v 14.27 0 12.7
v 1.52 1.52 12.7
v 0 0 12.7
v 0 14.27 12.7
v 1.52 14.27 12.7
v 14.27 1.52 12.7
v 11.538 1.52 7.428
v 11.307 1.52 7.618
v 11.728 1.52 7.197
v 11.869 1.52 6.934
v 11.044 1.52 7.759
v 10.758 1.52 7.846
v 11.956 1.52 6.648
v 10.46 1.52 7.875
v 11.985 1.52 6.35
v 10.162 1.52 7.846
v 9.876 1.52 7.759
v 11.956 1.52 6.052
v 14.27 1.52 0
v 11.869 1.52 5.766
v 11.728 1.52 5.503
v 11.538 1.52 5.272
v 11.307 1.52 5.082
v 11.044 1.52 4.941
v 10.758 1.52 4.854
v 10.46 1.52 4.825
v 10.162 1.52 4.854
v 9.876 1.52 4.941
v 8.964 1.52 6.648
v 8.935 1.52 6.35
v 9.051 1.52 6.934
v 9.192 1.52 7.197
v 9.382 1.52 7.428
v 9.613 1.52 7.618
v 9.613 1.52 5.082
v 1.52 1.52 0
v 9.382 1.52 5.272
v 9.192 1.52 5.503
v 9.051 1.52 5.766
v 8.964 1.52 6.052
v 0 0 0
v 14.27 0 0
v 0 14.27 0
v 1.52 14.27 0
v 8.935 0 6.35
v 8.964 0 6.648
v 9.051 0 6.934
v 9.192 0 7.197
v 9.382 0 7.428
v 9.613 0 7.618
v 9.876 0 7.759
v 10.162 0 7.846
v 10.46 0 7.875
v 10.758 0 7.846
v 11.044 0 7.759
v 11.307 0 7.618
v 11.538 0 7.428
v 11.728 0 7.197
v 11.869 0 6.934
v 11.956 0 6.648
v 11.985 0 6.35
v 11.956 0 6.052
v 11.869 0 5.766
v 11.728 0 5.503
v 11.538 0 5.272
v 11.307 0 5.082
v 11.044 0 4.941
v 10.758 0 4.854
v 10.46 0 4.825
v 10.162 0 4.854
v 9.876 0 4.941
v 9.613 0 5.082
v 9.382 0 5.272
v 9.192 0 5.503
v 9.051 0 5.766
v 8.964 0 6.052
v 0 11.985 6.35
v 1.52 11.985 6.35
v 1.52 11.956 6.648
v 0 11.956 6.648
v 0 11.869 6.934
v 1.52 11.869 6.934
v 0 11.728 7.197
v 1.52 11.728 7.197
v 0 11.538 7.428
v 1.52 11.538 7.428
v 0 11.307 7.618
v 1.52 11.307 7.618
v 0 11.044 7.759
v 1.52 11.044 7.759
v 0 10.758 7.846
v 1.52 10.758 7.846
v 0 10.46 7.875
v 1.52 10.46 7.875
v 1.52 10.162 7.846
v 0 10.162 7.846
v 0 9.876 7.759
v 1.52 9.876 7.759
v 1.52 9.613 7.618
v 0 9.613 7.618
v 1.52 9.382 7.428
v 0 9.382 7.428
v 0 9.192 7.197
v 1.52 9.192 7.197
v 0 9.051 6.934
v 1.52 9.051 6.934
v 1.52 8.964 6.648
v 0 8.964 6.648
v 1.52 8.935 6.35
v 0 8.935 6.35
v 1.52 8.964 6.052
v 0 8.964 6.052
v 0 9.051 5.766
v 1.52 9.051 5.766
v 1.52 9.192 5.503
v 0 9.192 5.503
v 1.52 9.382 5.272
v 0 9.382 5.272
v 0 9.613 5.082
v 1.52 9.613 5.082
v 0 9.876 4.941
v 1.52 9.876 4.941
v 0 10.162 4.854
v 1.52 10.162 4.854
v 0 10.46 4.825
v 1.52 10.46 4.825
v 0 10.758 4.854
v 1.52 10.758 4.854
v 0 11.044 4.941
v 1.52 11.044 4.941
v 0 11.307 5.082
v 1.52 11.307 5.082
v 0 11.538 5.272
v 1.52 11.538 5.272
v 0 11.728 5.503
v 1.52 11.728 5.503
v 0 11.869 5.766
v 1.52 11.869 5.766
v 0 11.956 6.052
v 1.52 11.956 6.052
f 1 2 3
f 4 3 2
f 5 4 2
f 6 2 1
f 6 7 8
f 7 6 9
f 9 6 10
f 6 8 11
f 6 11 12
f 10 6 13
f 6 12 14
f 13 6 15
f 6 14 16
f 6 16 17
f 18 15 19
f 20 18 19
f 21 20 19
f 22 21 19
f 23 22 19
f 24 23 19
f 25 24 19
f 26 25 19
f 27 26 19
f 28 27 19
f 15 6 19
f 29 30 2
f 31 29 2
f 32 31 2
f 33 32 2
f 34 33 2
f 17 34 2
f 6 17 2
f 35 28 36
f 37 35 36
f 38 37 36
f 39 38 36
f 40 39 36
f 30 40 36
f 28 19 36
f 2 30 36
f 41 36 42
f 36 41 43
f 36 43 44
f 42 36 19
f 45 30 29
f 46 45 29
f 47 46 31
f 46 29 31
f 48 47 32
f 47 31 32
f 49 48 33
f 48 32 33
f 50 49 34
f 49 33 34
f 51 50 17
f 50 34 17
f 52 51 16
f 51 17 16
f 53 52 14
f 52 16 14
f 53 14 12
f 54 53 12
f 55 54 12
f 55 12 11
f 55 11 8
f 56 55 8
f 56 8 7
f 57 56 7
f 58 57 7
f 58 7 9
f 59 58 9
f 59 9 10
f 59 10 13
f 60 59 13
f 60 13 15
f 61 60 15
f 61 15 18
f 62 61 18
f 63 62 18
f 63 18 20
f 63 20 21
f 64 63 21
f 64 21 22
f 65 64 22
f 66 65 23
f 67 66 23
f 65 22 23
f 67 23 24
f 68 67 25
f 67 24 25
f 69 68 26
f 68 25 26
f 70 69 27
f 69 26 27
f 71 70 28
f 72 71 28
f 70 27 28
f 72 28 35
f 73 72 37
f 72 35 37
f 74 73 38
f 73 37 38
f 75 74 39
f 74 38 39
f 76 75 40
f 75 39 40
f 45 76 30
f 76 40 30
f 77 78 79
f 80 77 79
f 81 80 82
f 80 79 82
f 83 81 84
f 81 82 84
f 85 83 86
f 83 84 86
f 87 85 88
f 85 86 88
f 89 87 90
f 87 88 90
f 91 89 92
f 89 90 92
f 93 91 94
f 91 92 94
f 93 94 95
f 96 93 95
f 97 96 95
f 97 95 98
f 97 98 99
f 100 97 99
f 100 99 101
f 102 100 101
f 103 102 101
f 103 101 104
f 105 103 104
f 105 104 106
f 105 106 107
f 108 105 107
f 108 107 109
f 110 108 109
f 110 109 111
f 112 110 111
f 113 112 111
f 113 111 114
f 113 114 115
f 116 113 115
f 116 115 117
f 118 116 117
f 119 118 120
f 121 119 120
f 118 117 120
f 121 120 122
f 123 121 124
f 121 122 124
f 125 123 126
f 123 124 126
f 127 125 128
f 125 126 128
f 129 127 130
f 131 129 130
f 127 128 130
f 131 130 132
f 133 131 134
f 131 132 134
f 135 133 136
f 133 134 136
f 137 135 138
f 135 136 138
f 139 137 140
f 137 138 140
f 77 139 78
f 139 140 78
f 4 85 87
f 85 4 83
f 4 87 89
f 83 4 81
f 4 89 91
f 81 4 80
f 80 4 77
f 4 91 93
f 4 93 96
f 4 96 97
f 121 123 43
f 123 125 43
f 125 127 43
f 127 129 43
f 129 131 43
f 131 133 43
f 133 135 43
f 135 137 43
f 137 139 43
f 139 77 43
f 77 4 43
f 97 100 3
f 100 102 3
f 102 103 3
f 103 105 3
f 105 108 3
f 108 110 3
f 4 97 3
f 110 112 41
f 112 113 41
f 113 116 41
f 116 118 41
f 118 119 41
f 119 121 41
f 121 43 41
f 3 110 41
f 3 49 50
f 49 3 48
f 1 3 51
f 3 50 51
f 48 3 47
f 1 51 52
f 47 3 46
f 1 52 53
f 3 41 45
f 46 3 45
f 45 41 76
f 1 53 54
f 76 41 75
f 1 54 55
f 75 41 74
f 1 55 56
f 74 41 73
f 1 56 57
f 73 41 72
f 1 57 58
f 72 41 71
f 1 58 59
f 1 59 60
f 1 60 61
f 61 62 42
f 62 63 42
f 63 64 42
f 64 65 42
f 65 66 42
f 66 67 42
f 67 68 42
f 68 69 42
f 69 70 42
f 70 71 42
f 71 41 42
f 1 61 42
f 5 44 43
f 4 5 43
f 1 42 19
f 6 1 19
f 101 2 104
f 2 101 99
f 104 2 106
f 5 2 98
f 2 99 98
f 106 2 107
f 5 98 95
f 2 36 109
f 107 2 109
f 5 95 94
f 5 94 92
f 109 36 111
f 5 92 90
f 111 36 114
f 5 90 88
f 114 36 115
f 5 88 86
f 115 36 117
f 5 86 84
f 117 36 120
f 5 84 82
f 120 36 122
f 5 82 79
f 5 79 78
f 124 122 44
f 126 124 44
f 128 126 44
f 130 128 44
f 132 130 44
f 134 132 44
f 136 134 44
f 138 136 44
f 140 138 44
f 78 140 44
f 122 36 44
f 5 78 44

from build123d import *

# Parameters (mm, degrees)
BOSS_EXTRU_1_DEPTH      = 12.7
ESQUISSE2_R             = 1.525
ENL_V_MAT_EXTRU_1_DEPTH = 12.7
ESQUISSE3_R             = 1.525
ENL_V_MAT_EXTRU_2_DEPTH = 12.7


with BuildPart() as part:
    # Esquisse1 → Boss.-Extru.1 (new body)
    with BuildSketch(Plane.XY):
        Polygon((0, 0), (14.27, 0), (14.27, 1.52), (1.52, 1.52), (1.52, 14.27), (0, 14.27), align=None)
    extrude(amount=BOSS_EXTRU_1_DEPTH)

    # Esquisse2 → Enlèv. mat.-Extru.1 (cut)
    with BuildSketch(Plane(origin=(1.52, 0, 0), x_dir=(0, 0, -1), z_dir=(1, 0, 0))):
        with Locations(Location((-6.35, 10.46, 0), (0, 0, 90))):
            Circle(ESQUISSE2_R)
    extrude(amount=-ENL_V_MAT_EXTRU_1_DEPTH, mode=Mode.SUBTRACT)

    # Esquisse3 → Enlèv. mat.-Extru.2 (cut)
    with BuildSketch(Plane(origin=(0, 1.52, 0), x_dir=(1, 0, 0), z_dir=(0, 1, 0))):
        with Locations(Location((10.46, -6.35, 0), (0, 0, 180))):
            Circle(ESQUISSE3_R)
    extrude(amount=-ENL_V_MAT_EXTRU_2_DEPTH, mode=Mode.SUBTRACT)


solid = part.part
